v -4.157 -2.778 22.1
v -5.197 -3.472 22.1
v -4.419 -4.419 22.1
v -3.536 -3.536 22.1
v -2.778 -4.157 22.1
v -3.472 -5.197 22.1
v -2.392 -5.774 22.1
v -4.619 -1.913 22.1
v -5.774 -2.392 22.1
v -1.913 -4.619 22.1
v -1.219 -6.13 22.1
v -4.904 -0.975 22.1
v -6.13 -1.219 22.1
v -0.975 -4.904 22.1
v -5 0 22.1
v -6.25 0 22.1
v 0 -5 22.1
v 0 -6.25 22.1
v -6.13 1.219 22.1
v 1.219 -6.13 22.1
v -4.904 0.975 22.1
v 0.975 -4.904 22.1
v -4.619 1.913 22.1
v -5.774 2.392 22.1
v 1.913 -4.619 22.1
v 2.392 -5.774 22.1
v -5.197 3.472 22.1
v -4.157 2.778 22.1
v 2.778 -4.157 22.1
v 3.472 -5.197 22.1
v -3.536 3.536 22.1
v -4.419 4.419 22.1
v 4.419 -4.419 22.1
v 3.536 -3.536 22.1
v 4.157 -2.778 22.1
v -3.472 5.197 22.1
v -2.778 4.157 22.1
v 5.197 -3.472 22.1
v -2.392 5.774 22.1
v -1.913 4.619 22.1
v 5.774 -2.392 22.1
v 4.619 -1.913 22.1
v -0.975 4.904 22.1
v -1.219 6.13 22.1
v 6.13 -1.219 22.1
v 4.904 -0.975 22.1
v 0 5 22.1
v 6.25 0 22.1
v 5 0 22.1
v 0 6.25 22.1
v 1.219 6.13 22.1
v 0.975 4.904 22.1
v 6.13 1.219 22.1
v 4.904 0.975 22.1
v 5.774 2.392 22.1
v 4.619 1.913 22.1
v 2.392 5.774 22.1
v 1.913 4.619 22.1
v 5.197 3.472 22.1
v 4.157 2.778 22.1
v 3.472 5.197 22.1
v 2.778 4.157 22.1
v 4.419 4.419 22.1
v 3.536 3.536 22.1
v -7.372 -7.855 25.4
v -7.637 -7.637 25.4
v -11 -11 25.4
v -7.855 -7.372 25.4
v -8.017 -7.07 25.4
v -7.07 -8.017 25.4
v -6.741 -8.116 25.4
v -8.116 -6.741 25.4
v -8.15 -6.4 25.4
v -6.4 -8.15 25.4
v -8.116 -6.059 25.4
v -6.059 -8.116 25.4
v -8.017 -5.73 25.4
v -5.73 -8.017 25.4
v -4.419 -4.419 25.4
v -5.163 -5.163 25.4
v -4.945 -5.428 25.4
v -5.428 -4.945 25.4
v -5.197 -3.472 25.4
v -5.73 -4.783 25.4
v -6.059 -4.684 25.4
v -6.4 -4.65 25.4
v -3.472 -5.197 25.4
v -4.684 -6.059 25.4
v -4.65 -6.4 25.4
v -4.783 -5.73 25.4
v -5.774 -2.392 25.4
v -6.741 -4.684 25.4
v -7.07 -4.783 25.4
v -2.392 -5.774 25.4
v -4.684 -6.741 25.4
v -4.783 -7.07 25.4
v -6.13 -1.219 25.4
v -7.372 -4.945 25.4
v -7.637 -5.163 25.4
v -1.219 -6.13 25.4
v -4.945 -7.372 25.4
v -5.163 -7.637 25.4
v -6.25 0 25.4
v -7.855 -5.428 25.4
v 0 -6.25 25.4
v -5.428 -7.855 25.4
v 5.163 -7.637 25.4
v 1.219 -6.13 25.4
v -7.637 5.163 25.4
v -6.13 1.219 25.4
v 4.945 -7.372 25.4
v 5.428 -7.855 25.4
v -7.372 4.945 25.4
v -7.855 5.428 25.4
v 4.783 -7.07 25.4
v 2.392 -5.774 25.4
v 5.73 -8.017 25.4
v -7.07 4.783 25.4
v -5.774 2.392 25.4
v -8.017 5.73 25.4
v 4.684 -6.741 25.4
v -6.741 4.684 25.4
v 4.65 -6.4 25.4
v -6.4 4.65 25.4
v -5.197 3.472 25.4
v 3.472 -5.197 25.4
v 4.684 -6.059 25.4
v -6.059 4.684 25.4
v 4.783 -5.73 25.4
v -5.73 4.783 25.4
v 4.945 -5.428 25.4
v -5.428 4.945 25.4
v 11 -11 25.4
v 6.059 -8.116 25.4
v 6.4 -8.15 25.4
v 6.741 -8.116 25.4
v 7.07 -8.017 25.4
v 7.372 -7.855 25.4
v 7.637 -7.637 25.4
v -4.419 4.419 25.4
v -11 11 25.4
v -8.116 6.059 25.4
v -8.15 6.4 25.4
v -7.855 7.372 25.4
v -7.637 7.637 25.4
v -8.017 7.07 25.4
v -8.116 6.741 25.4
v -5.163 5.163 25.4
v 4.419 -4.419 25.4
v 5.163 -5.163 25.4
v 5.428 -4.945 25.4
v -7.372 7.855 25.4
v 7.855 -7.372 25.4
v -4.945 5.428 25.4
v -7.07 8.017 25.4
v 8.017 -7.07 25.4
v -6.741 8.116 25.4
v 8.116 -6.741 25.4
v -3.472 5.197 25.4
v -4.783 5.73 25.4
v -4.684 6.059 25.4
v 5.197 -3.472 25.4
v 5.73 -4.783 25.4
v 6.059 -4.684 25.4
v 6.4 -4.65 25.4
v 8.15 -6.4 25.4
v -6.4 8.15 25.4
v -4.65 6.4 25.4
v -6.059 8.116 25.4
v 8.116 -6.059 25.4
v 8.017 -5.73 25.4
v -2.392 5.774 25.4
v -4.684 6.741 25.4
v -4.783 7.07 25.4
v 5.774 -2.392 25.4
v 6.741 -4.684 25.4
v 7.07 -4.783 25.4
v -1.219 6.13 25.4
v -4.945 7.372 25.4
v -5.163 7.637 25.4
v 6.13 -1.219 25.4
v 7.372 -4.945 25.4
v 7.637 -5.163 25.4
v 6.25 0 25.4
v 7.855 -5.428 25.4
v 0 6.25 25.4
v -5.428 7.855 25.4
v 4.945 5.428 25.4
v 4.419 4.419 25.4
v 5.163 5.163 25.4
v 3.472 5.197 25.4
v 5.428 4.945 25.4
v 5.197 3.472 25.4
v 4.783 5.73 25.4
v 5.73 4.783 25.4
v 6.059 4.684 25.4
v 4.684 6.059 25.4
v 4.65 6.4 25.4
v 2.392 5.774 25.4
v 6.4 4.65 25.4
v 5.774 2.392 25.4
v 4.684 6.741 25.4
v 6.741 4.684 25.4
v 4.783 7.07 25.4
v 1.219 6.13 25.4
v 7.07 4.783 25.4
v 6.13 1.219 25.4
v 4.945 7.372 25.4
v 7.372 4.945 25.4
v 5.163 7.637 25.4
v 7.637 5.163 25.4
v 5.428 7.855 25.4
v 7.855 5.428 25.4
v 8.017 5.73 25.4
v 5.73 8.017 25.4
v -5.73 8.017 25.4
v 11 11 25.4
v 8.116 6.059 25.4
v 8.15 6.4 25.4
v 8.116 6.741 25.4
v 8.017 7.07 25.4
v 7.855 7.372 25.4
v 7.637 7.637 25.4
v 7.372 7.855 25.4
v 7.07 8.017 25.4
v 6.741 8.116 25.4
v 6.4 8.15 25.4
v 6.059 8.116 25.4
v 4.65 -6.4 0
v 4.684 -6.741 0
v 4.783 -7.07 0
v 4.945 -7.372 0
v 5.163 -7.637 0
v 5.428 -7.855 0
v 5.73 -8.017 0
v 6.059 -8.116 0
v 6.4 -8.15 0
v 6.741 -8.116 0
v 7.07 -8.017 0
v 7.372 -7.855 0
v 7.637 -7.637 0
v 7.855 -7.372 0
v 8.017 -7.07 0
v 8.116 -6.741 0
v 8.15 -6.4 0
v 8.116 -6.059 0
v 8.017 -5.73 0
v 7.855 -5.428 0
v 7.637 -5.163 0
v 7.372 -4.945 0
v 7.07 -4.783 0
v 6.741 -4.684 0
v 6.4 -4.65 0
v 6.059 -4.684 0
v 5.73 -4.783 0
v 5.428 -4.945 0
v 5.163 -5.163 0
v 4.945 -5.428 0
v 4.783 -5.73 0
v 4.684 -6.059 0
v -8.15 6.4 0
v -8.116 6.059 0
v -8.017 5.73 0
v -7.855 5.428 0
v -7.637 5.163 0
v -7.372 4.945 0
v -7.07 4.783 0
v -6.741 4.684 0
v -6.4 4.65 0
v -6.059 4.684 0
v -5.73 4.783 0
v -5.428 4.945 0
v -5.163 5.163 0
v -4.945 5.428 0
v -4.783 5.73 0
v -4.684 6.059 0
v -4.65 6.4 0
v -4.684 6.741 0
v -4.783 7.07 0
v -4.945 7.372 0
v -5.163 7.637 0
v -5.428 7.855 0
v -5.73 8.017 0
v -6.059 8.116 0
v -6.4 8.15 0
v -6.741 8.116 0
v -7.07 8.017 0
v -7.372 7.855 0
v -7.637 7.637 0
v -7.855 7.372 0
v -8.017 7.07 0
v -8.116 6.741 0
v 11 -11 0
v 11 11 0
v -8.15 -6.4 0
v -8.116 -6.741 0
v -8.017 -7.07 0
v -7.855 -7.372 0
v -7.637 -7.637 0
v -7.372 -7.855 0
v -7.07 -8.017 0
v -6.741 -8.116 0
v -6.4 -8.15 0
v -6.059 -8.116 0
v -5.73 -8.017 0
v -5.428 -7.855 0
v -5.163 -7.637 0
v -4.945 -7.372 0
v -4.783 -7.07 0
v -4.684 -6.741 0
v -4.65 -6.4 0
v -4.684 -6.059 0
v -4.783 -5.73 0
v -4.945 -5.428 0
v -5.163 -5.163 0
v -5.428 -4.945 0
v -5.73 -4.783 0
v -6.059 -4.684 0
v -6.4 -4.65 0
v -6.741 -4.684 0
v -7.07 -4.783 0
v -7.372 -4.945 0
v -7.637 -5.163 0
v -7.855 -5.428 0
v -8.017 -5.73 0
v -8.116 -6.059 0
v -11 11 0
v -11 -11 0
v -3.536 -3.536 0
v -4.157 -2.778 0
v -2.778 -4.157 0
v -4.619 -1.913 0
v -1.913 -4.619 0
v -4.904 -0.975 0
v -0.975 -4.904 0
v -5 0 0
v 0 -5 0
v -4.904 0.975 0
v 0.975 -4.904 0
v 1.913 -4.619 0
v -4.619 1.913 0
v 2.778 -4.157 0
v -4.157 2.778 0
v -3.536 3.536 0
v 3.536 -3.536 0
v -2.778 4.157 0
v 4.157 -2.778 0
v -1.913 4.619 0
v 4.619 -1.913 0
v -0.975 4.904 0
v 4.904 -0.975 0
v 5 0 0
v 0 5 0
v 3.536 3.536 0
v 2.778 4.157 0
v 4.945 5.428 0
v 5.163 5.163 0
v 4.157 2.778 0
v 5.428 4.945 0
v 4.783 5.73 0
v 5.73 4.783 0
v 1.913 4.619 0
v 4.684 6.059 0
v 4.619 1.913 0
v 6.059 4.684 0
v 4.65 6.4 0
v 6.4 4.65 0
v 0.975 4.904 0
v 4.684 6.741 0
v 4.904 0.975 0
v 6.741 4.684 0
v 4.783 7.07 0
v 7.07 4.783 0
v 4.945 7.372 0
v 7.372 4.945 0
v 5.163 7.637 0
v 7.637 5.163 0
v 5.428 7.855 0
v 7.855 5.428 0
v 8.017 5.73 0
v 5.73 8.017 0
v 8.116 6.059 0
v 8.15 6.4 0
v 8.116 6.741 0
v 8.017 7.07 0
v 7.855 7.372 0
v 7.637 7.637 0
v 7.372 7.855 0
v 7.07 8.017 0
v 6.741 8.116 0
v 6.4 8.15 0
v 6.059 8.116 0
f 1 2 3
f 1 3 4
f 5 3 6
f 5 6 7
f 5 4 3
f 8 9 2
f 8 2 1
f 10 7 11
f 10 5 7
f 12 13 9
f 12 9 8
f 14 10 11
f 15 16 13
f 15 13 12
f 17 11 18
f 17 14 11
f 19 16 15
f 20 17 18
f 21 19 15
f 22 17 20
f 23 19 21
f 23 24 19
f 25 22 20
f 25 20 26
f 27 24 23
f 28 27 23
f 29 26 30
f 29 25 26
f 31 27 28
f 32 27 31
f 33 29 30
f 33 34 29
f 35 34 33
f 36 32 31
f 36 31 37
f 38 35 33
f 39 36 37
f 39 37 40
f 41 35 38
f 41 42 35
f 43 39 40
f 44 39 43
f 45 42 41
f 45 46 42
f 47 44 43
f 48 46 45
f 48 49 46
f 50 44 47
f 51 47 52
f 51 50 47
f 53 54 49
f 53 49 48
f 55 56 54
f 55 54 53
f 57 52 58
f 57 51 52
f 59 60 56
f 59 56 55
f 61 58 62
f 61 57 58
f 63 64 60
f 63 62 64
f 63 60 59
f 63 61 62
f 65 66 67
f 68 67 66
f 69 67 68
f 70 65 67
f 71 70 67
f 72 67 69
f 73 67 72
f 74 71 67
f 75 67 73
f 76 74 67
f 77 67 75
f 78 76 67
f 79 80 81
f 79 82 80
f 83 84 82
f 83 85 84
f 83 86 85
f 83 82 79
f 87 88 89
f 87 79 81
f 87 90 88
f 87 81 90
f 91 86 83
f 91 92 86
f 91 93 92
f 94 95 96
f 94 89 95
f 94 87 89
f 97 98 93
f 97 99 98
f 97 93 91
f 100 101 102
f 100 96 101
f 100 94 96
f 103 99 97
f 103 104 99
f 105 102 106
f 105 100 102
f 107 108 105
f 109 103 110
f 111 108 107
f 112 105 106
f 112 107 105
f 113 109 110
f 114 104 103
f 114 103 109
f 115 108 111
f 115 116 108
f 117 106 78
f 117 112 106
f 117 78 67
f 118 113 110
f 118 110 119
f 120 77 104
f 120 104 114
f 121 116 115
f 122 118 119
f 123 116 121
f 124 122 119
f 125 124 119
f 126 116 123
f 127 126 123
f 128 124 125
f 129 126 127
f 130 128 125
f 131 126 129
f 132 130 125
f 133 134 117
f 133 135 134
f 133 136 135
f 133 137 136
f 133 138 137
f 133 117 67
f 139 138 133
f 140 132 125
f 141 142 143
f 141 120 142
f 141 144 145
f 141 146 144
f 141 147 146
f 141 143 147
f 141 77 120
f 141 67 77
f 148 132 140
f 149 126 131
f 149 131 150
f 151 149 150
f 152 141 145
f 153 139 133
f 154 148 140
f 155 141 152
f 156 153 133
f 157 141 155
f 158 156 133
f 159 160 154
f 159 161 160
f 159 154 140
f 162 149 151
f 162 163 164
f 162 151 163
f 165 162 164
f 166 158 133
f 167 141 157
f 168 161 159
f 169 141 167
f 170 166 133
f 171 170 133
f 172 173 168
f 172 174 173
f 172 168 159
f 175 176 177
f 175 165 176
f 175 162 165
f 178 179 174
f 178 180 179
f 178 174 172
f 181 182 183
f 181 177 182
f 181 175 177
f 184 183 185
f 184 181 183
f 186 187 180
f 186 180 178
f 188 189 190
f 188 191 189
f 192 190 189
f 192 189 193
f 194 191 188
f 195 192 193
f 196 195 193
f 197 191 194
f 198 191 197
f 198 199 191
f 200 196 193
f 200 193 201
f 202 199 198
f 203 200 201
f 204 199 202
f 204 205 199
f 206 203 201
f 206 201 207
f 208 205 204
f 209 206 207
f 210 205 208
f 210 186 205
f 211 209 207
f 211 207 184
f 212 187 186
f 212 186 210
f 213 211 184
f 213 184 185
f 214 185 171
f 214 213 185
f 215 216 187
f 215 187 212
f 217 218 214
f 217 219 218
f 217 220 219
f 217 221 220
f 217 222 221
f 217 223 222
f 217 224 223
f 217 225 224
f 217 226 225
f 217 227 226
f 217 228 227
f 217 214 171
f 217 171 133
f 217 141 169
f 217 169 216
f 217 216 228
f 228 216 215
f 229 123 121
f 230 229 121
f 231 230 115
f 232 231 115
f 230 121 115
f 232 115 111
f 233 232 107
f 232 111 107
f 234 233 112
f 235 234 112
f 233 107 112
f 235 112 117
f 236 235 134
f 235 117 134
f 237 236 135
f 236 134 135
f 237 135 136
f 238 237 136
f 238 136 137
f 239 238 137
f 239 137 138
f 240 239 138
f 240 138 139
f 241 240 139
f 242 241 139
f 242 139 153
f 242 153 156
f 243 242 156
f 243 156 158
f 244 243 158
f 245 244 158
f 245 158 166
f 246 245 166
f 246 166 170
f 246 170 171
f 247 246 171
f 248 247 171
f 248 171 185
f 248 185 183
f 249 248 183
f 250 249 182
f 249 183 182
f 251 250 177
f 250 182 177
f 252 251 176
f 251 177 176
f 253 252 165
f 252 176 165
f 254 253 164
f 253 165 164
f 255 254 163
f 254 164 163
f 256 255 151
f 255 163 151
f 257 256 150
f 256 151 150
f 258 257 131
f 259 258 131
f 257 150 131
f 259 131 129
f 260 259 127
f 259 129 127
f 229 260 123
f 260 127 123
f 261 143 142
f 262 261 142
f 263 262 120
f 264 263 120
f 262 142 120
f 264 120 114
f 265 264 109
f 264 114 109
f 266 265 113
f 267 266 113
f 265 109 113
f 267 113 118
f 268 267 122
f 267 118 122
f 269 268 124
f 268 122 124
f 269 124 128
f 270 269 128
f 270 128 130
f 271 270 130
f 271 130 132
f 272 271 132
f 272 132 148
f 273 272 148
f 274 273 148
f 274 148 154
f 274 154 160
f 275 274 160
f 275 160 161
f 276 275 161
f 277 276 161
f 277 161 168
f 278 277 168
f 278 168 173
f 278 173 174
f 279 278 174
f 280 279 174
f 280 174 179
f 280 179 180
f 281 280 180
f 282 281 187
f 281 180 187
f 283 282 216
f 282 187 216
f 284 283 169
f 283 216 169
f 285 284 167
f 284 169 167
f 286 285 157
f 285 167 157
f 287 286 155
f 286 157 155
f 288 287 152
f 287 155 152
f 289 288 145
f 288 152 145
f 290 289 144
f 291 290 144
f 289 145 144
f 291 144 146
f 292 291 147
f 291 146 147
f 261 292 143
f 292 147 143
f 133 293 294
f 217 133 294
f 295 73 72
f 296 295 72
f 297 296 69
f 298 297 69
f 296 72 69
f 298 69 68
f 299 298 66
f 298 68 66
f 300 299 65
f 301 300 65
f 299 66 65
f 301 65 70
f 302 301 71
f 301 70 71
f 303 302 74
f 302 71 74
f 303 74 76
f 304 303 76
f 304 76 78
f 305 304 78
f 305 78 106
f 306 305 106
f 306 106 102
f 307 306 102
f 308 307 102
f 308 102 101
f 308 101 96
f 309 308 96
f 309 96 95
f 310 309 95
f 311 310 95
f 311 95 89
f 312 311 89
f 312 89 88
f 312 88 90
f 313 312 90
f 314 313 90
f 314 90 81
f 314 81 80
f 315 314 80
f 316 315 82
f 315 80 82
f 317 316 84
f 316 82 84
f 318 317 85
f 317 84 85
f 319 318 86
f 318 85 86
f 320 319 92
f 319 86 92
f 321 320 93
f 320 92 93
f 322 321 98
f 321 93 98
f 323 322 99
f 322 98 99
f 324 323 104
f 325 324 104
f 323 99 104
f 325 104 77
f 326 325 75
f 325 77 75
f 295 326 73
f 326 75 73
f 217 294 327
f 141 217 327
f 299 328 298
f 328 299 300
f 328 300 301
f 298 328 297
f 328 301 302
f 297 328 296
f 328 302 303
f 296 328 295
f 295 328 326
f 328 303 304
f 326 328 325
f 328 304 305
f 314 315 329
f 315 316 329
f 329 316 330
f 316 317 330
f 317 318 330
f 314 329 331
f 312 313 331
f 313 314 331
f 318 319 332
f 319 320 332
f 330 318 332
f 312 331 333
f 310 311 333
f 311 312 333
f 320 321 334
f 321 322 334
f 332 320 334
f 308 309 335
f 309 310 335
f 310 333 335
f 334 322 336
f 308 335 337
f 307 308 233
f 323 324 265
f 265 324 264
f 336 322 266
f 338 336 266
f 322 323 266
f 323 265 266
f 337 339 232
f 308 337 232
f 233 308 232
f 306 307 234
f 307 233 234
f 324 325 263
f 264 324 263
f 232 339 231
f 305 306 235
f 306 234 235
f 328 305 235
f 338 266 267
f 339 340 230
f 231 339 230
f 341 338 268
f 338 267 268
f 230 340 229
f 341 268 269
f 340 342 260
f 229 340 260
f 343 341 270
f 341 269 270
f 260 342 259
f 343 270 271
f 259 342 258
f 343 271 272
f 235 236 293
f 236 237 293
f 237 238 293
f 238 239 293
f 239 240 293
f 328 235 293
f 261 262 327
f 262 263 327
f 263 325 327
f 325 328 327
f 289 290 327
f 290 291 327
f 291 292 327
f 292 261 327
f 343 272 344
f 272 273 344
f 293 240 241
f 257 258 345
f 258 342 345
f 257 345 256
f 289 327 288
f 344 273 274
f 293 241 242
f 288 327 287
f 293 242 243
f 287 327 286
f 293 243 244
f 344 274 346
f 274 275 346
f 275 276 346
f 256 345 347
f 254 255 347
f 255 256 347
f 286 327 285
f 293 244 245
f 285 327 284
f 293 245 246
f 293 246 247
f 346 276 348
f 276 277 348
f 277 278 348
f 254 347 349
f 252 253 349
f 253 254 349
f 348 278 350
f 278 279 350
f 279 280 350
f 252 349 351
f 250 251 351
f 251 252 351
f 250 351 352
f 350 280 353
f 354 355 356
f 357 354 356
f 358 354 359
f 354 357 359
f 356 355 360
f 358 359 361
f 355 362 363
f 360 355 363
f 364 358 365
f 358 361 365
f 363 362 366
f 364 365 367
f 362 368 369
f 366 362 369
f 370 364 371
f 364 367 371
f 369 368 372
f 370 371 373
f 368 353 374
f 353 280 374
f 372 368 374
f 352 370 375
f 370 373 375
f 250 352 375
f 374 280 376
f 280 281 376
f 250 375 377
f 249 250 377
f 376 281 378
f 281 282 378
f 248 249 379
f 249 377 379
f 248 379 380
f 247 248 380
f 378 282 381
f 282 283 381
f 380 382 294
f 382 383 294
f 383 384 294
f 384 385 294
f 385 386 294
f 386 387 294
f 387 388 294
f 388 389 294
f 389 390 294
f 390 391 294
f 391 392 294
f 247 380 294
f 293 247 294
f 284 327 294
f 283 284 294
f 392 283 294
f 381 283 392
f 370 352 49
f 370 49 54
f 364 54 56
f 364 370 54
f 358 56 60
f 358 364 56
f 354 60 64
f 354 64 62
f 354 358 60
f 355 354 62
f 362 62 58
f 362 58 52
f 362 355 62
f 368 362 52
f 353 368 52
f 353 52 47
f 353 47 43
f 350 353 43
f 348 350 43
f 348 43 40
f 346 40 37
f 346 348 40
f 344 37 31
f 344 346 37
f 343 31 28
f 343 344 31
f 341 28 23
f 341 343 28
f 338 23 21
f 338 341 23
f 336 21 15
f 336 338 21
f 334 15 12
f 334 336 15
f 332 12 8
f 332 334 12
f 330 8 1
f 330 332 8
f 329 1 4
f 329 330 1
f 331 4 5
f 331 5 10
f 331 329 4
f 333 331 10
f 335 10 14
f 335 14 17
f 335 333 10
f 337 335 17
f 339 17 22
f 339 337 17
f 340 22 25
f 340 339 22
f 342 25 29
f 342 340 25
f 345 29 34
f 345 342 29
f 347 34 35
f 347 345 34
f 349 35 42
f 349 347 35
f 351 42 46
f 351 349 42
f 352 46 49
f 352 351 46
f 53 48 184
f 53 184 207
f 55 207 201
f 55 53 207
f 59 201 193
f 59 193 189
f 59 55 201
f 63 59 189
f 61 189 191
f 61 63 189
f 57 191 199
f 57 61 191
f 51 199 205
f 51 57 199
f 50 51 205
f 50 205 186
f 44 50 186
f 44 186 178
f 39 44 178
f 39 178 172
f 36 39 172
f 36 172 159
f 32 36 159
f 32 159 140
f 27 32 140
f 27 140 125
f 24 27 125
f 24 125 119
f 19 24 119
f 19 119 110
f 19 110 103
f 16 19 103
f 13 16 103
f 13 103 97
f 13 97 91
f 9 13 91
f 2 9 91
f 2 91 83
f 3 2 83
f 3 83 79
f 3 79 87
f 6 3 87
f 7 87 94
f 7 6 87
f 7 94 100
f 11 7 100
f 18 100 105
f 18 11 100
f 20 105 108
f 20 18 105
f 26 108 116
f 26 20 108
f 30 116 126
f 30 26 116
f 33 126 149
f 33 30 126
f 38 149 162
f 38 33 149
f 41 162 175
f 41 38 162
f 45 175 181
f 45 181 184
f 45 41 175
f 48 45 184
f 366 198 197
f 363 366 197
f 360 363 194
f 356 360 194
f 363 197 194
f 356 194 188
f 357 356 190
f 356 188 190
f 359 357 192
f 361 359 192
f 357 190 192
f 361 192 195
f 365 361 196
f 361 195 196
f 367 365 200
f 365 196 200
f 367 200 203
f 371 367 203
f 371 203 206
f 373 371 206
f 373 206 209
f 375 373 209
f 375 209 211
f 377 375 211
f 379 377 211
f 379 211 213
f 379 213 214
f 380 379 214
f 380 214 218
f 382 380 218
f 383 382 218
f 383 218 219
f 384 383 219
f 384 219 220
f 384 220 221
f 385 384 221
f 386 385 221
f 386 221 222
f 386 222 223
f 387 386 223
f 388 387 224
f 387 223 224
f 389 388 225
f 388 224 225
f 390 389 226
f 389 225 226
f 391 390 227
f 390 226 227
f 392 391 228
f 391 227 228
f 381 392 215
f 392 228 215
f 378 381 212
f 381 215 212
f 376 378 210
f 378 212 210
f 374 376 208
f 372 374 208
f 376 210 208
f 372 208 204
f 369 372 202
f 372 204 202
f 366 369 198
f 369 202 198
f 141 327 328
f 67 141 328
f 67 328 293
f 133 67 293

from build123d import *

# Parameters (mm, degrees)
F0_W     = 4.6
F0_H     = 4.6
F0_R     = 6.25
F1_DEPTH = 25.4
F0_R_2   = 5
F2_DEPTH = 22.1
F3_D     = 3.5


with BuildPart() as f1:
    # F0 (on Top) → F1 (new body)
    with BuildSketch(Plane.XY):
        with Locations((8.7, -8.7)):
            Rectangle(F0_W, F0_H)
        Polygon((-6.4, -11), (6.4, -11), (6.4, -6.4), (11, -6.4), (11, 6.4), (6.4, 6.4), (6.4, 11), (-6.4, 11), (-6.4, 6.4), (-11, 6.4), (-11, -6.4), (-6.4, -6.4), align=None)
        Circle(F0_R, mode=Mode.SUBTRACT)
        with Locations((-8.7, -8.7)):
            Rectangle(F0_W, F0_H)
        with Locations((8.7, 8.7)):
            Rectangle(F0_W, F0_H)
        with Locations((-8.7, 8.7)):
            Rectangle(F0_W, F0_H)
    extrude(amount=F1_DEPTH)

    # F0 (on Top) → F2 (join)
    with BuildSketch(Plane.XY):
        Circle(F0_R)
        Circle(F0_R_2, mode=Mode.SUBTRACT)
    extrude(amount=F2_DEPTH)

    # F3 (through all)
    with Locations(Plane(origin=(0, 0, 0), x_dir=(1, 0, 0), z_dir=(0, 0, -1))):
        with Locations((-6.4, -6.4), (-6.4, 6.4), (6.4, -6.4), (6.4, 6.4)):
            Hole(F3_D / 2)


solid = f1.part
